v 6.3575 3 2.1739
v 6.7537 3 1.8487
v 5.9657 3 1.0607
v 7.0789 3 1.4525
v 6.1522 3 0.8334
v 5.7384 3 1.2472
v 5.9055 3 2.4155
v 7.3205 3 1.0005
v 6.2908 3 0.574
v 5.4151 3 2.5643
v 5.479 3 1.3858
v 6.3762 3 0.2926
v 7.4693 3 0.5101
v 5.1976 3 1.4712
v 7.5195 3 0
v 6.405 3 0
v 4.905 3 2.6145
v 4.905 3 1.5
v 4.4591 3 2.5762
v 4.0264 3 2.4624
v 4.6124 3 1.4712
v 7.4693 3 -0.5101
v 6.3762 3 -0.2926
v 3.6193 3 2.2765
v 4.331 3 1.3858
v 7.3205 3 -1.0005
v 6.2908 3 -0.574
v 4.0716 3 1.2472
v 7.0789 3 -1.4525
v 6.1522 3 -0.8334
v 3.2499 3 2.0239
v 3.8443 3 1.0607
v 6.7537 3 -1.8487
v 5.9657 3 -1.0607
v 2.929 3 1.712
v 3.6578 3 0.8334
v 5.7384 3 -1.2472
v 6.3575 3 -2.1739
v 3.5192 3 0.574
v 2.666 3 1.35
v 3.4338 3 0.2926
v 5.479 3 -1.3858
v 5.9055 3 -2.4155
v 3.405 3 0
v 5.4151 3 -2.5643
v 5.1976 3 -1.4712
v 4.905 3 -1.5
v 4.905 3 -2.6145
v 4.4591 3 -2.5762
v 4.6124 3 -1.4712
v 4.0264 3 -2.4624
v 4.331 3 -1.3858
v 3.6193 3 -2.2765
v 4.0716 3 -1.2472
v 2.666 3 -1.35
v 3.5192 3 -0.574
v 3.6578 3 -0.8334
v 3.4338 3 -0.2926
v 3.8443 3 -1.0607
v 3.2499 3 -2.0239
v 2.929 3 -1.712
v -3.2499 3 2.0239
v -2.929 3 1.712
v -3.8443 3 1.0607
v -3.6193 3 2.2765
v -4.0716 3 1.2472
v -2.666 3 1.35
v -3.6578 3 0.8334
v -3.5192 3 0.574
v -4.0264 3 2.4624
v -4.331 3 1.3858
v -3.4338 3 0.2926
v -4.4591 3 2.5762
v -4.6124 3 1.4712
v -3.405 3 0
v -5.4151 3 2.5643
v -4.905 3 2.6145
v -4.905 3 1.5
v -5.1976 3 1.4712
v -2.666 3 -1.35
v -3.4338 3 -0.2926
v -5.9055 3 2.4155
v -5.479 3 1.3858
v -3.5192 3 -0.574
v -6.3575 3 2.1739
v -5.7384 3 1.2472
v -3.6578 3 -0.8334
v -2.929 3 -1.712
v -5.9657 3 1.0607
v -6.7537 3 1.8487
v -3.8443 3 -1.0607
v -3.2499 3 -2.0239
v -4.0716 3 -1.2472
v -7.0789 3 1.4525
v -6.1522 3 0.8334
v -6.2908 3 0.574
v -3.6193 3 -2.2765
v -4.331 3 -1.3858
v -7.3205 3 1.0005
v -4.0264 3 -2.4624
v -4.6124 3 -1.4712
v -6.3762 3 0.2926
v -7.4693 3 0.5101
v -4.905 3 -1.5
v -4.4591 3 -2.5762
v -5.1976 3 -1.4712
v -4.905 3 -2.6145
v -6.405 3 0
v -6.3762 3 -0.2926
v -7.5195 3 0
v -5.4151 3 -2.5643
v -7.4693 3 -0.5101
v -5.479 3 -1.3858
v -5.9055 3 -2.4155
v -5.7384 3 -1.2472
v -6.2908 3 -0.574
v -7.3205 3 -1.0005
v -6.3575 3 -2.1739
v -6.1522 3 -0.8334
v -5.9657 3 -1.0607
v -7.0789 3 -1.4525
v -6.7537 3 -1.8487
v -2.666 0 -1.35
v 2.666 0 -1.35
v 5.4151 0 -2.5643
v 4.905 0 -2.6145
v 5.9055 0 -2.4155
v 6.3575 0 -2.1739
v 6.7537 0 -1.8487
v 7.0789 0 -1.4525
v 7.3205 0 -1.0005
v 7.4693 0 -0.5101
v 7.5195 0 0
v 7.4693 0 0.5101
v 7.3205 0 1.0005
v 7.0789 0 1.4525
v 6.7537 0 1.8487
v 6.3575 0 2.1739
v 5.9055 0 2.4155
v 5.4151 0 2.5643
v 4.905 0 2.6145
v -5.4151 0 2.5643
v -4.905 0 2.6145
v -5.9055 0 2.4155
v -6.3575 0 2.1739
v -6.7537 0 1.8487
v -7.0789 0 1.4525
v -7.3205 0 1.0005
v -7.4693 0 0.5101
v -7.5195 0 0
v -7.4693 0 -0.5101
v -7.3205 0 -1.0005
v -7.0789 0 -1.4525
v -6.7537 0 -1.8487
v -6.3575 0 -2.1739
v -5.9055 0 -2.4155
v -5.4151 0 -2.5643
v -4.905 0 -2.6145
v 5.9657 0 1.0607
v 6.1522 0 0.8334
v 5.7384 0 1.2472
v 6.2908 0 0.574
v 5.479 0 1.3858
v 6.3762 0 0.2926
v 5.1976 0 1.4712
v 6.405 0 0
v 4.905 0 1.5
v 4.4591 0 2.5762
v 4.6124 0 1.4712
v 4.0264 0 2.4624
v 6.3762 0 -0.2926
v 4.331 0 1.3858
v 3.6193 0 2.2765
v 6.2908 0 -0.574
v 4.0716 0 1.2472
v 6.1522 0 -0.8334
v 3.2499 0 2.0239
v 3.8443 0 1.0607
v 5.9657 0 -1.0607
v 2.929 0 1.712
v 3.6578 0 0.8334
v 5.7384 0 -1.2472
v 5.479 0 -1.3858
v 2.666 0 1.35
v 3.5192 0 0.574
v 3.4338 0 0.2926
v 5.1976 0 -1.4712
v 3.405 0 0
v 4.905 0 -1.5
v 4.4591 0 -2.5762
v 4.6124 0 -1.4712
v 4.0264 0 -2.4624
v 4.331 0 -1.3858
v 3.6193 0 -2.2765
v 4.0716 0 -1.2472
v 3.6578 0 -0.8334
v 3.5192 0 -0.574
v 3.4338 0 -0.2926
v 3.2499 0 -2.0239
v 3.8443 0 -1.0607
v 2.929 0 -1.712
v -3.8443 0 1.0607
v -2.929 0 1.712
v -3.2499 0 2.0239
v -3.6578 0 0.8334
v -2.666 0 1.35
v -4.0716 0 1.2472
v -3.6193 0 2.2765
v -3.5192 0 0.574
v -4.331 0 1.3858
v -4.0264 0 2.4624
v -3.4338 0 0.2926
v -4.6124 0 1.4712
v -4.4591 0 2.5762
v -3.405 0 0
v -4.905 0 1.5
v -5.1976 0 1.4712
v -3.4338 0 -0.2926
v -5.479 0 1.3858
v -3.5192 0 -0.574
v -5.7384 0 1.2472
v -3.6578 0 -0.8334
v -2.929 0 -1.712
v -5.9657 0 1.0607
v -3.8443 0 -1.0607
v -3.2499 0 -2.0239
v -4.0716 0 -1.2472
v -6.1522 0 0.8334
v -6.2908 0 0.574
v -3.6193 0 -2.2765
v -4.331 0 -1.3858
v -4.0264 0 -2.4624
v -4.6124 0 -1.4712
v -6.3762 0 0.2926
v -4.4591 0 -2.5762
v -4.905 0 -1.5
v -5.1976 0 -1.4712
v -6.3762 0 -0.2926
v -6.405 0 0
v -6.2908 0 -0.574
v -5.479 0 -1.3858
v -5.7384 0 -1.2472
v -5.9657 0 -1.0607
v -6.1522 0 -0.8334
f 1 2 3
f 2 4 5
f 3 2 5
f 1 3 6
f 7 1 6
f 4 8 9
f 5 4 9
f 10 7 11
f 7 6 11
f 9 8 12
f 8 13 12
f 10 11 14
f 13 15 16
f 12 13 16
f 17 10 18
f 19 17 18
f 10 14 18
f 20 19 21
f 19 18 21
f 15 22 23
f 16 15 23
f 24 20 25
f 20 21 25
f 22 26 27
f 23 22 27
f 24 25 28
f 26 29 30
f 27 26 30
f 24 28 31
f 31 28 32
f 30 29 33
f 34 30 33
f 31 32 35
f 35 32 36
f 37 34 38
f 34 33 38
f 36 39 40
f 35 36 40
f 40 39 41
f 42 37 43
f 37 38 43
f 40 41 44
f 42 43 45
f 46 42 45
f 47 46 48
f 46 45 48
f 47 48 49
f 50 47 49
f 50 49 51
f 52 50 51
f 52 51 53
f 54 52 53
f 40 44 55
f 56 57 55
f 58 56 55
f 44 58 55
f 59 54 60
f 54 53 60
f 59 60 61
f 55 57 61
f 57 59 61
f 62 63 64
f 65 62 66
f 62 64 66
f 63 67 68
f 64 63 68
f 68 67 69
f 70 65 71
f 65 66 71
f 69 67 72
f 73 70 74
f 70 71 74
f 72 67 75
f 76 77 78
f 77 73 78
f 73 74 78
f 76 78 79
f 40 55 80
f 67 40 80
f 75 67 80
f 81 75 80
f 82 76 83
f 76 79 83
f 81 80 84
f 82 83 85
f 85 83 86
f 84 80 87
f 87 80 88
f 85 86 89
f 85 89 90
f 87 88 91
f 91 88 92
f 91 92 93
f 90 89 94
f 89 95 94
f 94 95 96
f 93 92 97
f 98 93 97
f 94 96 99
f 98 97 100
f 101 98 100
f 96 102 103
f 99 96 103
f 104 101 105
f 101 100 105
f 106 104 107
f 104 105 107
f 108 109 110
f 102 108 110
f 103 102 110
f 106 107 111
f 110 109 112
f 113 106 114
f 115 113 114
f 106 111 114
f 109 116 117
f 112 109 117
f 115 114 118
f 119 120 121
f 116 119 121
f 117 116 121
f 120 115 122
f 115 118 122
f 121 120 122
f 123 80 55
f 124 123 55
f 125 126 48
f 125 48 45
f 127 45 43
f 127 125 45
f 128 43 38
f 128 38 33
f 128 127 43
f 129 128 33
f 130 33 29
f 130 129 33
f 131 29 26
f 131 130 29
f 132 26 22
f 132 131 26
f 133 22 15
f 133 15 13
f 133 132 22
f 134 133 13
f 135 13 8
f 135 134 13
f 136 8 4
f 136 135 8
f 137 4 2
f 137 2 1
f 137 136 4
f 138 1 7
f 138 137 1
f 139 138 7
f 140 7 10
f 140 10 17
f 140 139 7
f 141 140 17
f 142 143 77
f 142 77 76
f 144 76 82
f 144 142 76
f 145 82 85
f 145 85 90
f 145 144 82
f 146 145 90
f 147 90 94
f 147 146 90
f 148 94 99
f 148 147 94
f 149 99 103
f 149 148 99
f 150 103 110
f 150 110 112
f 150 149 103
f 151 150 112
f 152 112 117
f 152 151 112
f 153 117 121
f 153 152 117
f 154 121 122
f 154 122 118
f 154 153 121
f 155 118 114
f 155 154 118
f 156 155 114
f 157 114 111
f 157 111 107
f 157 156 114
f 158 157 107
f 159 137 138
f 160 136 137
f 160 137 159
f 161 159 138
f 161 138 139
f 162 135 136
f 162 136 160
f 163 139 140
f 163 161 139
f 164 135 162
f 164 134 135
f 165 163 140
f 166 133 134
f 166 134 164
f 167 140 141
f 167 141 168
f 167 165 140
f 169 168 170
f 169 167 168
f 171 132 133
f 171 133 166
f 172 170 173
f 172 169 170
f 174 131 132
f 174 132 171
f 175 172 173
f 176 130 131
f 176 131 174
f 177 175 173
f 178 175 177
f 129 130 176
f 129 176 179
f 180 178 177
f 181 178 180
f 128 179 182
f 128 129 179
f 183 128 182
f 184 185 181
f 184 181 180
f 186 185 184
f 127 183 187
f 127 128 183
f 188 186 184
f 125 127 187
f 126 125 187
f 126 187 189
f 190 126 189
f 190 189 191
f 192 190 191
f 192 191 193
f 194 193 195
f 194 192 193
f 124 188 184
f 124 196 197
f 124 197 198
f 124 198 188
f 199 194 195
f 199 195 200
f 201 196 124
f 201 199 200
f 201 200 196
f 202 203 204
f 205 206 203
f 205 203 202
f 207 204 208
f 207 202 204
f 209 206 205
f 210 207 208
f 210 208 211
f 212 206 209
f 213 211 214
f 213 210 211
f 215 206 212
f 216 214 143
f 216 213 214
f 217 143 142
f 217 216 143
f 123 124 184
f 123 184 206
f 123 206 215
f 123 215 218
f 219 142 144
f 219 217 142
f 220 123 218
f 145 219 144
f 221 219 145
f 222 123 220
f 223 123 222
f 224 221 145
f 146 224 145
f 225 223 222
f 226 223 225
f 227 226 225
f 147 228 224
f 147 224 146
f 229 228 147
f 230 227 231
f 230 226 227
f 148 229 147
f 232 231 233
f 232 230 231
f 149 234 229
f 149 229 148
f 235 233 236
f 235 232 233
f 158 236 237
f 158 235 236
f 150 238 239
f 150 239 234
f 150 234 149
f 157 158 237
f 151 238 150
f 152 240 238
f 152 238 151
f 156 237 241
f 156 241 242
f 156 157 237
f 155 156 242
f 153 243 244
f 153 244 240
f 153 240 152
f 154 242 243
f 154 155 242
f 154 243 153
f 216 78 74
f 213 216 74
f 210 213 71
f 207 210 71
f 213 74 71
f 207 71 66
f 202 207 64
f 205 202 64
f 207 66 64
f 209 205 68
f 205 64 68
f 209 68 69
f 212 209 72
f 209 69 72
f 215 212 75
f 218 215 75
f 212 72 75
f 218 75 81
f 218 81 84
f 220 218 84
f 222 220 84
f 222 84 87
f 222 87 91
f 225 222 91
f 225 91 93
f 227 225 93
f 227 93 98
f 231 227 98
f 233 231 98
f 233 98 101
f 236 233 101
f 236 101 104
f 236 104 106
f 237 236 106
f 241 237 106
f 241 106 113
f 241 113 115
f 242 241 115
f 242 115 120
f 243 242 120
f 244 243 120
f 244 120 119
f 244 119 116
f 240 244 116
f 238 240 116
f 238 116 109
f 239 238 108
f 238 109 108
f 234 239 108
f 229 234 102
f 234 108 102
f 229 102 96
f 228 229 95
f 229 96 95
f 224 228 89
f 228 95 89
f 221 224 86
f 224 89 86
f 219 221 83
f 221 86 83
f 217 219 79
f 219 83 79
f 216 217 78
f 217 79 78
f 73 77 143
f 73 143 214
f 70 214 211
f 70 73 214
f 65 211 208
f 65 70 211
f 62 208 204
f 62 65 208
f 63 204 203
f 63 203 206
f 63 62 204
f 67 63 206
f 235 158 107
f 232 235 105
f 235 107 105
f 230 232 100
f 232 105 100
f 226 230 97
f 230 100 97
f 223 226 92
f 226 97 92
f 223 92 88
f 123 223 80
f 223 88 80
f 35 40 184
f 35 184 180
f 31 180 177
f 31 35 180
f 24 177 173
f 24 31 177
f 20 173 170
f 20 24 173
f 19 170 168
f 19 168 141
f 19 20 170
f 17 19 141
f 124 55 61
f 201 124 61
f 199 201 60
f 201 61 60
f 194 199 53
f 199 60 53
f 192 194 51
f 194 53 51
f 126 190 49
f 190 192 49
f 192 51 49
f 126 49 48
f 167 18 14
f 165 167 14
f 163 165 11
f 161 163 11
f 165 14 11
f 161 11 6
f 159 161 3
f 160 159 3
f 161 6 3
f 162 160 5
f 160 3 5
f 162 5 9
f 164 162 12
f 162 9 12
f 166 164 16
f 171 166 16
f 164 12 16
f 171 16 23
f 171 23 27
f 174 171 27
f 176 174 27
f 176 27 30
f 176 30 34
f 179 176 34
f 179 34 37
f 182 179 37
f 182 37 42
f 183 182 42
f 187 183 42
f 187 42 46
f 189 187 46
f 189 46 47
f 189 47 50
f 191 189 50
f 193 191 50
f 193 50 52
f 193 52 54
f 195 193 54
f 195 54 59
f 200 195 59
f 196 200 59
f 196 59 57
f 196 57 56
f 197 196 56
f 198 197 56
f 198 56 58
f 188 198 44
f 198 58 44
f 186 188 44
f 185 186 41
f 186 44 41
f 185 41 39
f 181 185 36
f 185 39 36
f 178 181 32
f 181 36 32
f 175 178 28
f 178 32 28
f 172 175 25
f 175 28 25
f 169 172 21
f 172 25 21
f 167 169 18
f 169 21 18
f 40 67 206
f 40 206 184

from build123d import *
from build123d.topology import SkipClean

# Parameters (mm, degrees)
BOSS_EXTRUDE1_DEPTH = 3
SKETCH2_R           = 1.5
CUT_EXTRUDE1_DEPTH  = 9.507546276
CUT_EXTRUDE2_DEPTH  = 9.507546276


with BuildPart() as part:
    # Sketch1 → Boss-Extrude1 (new body)
    with BuildSketch(Plane(origin=(0, 0, 0), x_dir=(1, 0, 0), z_dir=(0, 1, 0))):
        with BuildLine():
            Line((-4.905, 2.614492754), (4.905, 2.614492754))
            ThreePointArc((4.905, 2.614492754), (7.519492754, 0), (4.905, -2.614492754))
            Line((4.905, -2.614492754), (-4.905, -2.614492754))
            ThreePointArc((-4.905, -2.614492754), (-7.519492754, 0), (-4.905, 2.614492754))
        make_face()
    extrude(amount=BOSS_EXTRUDE1_DEPTH)

    # Sketch2 → Cut-Extrude1 (cut, through all)
    with BuildSketch(Plane(origin=(0, 3, 0), x_dir=(1, 0, 0), z_dir=(0, 1, 0))):
        with Locations(Location((-4.905, 0, 0), (0, 0, 270))):
            Circle(SKETCH2_R)
        with Locations(Location((4.905, 0, 0), (0, 0, 270))):
            Circle(SKETCH2_R)
    extrude(amount=-CUT_EXTRUDE1_DEPTH, mode=Mode.SUBTRACT)

    # Sketch3 → Cut-Extrude2 (cut, through all)
    with SkipClean():  # the faces are left unmerged after this step: merging them gives an invalid solid
        with BuildSketch(Plane(origin=(0, 3, 0), x_dir=(1, 0, 0), z_dir=(0, 1, 0))):
            with BuildLine():
                Line((-2.666010862, 1.35), (2.666010862, 1.35))
                ThreePointArc((2.666010862, 1.35), (3.619308135, 2.276525596), (4.905, 2.614492754))
                Line((4.905, 2.614492754), (-4.905, 2.614492754))
                ThreePointArc((-4.905, 2.614492754), (-3.619308135, 2.276525596), (-2.666010862, 1.35))
            make_face()
            with BuildLine():
                Line((-2.666010862, -1.35), (2.666010862, -1.35))
                ThreePointArc((2.666010862, -1.35), (3.619308135, -2.276525596), (4.905, -2.614492754))
                Line((4.905, -2.614492754), (-4.905, -2.614492754))
                ThreePointArc((-4.905, -2.614492754), (-3.619308135, -2.276525596), (-2.666010862, -1.35))
            make_face()
        extrude(amount=-CUT_EXTRUDE2_DEPTH, mode=Mode.SUBTRACT)


solid = part.part
